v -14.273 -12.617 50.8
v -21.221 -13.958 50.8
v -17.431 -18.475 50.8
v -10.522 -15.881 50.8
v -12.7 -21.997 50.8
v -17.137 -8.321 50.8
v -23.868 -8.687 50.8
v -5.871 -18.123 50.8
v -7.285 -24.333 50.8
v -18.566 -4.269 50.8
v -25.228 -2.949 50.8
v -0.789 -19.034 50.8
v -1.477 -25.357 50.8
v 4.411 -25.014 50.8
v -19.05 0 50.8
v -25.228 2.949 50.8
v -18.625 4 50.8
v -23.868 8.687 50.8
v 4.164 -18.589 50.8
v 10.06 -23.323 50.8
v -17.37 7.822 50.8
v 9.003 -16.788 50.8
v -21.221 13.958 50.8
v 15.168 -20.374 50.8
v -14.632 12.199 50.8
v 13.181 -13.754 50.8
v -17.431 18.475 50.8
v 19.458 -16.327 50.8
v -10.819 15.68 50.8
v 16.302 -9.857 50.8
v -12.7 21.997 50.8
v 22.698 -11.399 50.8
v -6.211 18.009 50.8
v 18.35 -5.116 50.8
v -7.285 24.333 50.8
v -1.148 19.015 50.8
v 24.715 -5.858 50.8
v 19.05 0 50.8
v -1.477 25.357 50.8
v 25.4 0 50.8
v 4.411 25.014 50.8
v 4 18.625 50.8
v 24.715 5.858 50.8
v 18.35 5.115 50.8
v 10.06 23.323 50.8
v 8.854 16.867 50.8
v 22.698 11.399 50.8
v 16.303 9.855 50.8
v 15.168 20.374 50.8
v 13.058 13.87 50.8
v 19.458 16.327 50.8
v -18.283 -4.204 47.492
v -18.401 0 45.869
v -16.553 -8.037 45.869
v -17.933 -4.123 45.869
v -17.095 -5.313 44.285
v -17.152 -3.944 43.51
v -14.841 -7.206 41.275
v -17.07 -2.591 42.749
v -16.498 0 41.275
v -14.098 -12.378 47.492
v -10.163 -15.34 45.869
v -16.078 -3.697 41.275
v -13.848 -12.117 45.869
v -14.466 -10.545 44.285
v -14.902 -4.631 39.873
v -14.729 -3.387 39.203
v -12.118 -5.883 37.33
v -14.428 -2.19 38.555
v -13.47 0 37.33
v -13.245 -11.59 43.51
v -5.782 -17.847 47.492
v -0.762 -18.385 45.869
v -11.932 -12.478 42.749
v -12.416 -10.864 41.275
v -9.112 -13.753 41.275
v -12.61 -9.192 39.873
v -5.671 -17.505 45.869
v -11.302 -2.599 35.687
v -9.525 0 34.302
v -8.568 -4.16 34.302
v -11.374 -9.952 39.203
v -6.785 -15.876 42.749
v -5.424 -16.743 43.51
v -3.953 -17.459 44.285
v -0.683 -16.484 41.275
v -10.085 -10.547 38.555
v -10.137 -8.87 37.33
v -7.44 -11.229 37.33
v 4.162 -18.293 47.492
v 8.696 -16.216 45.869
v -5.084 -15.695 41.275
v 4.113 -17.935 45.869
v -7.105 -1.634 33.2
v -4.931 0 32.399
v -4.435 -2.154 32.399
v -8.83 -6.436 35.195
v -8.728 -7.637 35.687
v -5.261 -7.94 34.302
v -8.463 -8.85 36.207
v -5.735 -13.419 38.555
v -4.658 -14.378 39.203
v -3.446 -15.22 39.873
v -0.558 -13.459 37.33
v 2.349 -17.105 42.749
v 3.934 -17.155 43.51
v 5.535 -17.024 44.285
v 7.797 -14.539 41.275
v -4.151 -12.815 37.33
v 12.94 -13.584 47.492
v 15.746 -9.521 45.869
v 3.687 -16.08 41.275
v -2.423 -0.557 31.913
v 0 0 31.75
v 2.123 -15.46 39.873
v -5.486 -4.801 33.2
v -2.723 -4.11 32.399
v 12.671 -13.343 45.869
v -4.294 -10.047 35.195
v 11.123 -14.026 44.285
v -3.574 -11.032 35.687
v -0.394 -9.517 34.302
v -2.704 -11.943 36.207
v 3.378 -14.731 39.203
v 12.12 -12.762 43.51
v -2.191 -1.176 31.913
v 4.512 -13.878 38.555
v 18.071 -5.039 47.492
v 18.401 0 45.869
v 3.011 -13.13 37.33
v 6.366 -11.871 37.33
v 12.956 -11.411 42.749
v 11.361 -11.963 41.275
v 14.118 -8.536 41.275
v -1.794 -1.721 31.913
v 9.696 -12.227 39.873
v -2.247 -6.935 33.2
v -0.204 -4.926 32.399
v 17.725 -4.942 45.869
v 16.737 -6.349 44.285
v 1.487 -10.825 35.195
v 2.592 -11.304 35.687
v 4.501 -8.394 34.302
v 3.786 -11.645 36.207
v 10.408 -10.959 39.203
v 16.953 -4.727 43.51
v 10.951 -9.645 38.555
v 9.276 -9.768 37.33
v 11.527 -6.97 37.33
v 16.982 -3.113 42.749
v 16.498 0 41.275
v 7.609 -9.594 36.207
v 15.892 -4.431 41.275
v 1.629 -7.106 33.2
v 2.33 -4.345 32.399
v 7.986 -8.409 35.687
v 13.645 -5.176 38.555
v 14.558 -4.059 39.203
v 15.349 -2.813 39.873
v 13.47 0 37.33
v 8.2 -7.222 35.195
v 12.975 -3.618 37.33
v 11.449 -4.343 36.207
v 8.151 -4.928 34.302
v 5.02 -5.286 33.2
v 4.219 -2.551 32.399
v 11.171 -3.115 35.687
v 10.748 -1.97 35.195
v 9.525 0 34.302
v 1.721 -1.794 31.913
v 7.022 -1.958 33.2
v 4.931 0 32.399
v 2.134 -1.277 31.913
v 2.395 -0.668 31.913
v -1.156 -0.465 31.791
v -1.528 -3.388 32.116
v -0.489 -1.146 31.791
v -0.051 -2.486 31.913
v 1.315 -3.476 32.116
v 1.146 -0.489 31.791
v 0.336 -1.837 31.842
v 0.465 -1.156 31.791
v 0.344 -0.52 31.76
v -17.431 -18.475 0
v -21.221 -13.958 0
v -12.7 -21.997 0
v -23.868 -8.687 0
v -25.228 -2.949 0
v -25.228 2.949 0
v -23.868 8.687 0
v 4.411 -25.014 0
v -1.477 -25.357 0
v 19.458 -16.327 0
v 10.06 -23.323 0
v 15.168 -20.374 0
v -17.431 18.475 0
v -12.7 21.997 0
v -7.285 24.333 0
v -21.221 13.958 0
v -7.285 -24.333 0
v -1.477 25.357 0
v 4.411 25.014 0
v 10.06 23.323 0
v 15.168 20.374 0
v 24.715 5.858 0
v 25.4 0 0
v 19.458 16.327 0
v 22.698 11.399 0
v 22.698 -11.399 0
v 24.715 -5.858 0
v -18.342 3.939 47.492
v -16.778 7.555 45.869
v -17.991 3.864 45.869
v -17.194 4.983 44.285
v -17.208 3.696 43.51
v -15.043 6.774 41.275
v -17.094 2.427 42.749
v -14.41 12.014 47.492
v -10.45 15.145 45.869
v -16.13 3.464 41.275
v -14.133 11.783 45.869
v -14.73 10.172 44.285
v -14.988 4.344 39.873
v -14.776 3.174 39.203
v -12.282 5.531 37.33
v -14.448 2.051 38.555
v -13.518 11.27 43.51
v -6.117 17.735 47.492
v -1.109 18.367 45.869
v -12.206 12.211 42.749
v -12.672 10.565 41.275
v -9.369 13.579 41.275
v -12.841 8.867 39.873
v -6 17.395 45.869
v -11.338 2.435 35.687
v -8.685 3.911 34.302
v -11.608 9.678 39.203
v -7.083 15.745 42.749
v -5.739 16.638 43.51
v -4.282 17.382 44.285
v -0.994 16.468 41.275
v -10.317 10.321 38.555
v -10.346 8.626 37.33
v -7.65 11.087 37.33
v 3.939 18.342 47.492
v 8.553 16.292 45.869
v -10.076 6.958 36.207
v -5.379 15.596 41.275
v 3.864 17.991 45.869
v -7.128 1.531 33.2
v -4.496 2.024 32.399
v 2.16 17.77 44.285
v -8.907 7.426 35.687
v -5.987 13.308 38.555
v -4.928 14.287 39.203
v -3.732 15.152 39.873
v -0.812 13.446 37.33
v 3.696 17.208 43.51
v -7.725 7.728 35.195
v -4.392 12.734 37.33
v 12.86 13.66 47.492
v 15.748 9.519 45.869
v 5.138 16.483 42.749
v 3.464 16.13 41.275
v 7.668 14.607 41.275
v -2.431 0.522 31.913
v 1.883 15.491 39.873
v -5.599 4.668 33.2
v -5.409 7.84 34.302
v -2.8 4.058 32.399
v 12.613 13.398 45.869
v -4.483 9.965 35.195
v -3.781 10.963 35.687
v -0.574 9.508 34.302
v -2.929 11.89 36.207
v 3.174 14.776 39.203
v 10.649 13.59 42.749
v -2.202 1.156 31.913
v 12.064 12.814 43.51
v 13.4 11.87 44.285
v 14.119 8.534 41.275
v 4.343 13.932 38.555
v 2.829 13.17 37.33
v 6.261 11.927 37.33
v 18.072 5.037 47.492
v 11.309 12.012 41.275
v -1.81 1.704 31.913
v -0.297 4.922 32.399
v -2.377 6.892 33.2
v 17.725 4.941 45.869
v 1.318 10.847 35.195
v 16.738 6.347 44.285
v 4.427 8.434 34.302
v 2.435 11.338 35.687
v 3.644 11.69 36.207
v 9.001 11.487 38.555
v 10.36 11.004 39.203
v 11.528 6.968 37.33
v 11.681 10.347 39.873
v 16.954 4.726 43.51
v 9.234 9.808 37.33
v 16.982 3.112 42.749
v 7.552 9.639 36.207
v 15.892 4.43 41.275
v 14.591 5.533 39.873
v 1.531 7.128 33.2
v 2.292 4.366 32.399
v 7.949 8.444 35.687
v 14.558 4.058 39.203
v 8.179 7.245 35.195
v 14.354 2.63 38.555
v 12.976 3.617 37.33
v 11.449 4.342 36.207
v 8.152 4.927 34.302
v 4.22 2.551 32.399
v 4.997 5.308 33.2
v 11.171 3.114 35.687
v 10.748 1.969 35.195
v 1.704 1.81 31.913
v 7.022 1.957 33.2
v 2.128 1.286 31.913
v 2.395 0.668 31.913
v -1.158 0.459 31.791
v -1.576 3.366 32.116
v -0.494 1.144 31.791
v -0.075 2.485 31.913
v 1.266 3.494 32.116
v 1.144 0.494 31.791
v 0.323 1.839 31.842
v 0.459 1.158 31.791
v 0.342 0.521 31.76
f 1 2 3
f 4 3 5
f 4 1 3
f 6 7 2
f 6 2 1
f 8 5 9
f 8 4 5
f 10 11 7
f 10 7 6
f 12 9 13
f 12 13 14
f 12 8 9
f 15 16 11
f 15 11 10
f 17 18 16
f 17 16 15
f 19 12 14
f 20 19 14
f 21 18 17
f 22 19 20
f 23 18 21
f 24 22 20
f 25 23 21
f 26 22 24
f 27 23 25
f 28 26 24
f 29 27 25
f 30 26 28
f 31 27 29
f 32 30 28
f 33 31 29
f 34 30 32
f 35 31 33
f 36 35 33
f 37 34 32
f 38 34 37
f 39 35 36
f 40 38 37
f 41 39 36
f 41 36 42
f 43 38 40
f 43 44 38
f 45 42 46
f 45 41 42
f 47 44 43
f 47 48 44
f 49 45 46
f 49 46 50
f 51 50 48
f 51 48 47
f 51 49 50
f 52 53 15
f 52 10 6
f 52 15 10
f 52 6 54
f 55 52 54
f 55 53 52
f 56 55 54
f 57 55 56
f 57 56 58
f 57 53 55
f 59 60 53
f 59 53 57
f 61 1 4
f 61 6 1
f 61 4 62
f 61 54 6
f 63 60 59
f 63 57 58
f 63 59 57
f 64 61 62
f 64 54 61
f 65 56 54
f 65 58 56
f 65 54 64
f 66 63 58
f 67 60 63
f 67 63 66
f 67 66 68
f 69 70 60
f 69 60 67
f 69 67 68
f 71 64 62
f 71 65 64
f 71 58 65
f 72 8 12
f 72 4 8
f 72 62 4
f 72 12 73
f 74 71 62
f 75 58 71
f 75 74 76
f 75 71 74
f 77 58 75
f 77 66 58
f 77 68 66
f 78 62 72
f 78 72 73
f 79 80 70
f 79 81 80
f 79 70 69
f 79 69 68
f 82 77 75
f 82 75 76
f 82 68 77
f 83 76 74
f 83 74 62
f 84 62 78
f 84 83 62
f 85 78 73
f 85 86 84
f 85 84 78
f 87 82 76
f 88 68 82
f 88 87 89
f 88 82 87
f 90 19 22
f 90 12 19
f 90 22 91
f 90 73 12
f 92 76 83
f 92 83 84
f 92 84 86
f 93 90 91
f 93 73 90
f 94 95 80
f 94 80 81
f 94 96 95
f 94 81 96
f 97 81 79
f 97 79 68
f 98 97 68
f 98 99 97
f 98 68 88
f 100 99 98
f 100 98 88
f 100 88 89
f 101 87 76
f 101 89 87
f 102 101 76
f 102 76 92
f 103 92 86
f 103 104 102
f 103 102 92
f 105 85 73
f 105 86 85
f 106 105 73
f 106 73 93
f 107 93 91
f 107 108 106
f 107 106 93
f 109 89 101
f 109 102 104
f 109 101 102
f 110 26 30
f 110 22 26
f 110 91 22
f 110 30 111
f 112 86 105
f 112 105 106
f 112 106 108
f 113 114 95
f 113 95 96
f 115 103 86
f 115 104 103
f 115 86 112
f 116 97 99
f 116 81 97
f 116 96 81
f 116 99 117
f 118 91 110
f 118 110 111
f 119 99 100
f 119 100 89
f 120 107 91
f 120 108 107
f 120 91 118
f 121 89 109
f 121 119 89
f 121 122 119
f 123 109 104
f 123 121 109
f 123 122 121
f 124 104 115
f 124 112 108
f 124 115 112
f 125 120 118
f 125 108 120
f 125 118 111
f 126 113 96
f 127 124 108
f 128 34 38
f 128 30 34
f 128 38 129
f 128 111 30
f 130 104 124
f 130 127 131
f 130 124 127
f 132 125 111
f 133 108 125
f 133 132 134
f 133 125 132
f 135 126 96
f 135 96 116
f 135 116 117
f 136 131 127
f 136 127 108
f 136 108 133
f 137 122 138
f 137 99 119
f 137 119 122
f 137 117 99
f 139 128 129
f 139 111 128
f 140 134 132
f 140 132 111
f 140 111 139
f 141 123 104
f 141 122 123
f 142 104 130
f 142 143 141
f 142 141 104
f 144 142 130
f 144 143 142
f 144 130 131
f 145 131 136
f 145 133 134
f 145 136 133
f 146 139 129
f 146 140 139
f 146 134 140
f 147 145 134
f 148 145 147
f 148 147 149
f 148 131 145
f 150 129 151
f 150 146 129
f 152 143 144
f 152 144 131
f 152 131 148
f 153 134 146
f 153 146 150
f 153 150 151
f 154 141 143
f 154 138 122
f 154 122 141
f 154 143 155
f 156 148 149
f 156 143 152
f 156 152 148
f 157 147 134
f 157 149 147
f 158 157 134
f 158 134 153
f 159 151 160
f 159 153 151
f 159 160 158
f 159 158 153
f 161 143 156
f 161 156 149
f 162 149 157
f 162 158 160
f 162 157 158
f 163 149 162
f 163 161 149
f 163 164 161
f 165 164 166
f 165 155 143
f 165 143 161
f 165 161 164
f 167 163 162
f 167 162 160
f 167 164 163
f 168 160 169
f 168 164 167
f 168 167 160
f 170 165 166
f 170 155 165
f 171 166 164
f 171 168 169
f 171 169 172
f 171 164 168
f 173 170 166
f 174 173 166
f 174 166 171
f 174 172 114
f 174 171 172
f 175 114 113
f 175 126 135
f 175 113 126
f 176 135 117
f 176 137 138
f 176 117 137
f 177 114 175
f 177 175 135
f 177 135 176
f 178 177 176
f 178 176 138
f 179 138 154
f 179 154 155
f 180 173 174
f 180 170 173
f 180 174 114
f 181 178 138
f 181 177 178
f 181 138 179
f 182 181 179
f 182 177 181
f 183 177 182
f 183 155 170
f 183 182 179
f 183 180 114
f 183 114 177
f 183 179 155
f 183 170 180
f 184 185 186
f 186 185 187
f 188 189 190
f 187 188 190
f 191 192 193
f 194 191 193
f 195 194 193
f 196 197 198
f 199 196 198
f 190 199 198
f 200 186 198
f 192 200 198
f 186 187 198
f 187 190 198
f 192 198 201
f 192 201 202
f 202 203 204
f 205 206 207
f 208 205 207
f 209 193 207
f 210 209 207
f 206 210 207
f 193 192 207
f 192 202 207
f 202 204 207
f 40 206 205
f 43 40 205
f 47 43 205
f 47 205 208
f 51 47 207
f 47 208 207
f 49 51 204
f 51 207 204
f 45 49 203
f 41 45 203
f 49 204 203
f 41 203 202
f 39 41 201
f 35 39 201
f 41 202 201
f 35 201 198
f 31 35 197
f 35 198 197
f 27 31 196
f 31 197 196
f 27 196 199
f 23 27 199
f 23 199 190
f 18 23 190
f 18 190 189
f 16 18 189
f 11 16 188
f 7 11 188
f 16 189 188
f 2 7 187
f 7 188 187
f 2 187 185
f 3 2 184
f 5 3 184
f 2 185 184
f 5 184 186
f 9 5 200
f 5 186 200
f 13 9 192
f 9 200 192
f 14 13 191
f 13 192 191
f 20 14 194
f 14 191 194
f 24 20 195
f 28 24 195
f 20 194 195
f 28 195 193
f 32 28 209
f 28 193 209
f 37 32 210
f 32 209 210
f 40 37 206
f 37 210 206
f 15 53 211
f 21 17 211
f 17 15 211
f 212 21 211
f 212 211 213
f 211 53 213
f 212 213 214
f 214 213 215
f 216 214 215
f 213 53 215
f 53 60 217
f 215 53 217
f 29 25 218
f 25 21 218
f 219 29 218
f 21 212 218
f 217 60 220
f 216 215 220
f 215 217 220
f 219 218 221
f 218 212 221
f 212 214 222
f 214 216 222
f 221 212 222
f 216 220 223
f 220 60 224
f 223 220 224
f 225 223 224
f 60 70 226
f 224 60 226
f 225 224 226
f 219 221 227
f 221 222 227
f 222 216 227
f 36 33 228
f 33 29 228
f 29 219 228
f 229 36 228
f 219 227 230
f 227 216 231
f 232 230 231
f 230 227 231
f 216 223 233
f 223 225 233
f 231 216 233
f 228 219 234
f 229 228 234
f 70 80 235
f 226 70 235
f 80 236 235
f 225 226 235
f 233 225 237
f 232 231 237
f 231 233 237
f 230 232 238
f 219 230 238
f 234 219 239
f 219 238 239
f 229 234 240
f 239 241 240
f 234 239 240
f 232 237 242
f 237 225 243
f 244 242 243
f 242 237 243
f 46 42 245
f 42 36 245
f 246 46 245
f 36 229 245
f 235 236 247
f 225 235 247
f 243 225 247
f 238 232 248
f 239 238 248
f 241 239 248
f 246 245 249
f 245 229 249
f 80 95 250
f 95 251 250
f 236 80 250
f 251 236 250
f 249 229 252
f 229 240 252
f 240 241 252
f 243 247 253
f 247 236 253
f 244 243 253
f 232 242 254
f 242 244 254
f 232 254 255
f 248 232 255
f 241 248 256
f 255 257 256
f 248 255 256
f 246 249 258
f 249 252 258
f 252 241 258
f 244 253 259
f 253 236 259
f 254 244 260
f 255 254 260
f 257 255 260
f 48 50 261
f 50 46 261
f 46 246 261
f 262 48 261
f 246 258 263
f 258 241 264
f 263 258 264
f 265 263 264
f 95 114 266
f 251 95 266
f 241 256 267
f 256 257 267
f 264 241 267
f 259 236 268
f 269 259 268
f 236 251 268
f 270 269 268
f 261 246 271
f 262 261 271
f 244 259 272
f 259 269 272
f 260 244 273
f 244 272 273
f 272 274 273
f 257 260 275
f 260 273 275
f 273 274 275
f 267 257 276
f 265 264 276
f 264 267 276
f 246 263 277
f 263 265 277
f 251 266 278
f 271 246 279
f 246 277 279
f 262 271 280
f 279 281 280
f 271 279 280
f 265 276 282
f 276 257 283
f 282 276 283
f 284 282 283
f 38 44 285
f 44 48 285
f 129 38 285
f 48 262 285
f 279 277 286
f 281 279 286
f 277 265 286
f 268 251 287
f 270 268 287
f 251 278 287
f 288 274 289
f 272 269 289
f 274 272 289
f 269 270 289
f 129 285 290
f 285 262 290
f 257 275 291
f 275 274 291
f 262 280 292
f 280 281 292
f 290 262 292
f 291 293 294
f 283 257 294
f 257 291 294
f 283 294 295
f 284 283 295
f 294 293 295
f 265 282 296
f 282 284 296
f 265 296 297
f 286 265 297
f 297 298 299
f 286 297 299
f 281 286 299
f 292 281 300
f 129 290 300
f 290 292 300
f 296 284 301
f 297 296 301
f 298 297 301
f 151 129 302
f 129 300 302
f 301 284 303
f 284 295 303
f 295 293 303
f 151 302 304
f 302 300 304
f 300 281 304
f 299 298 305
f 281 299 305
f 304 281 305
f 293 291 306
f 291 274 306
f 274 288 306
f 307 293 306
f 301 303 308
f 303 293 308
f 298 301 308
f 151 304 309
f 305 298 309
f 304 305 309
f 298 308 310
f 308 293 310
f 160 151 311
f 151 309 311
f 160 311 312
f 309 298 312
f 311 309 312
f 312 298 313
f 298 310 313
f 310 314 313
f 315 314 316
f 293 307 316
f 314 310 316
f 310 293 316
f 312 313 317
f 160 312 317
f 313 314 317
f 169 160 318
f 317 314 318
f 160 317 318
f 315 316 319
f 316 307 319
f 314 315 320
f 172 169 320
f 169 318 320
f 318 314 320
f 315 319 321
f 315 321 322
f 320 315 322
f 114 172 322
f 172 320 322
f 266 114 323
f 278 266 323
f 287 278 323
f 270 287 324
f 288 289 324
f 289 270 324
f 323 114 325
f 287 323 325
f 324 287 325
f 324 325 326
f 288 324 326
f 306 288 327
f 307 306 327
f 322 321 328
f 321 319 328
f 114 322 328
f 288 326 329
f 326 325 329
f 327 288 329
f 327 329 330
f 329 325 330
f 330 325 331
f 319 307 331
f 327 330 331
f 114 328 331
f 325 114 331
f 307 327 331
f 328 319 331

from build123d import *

# Parameters (mm, degrees)
F0_R     = 25.4
F1_DEPTH = 50.8
F3_ANGLE = -180


with BuildPart() as f1:
    # F0 (on Top) → F1 (new body)
    with BuildSketch(Plane.XY):
        Circle(F0_R)
    extrude(amount=F1_DEPTH)

    # F2 (on Front) → F3 (revolve, cut)
    with BuildSketch(Plane.XZ):
        with BuildLine():
            Line((0, 31.75), (0, 69.849997))
            ThreePointArc((0, 69.849997), (-19.050003, 50.799999), (0, 31.75))
        make_face()
    revolve(axis=Axis((0, 0, 50.799999), (0, 0, -1)), revolution_arc=F3_ANGLE, mode=Mode.SUBTRACT)

    # F2 (on Front) → F4 (revolve, cut)
    with BuildSketch(Plane.XZ):
        with BuildLine():
            Line((0, 31.75), (0, 69.849997))
            ThreePointArc((0, 69.849997), (-19.050003, 50.799999), (0, 31.75))
        make_face()
    revolve(axis=Axis((0, 0, 0), (0, 0, -1)), mode=Mode.SUBTRACT)


solid = f1.part
